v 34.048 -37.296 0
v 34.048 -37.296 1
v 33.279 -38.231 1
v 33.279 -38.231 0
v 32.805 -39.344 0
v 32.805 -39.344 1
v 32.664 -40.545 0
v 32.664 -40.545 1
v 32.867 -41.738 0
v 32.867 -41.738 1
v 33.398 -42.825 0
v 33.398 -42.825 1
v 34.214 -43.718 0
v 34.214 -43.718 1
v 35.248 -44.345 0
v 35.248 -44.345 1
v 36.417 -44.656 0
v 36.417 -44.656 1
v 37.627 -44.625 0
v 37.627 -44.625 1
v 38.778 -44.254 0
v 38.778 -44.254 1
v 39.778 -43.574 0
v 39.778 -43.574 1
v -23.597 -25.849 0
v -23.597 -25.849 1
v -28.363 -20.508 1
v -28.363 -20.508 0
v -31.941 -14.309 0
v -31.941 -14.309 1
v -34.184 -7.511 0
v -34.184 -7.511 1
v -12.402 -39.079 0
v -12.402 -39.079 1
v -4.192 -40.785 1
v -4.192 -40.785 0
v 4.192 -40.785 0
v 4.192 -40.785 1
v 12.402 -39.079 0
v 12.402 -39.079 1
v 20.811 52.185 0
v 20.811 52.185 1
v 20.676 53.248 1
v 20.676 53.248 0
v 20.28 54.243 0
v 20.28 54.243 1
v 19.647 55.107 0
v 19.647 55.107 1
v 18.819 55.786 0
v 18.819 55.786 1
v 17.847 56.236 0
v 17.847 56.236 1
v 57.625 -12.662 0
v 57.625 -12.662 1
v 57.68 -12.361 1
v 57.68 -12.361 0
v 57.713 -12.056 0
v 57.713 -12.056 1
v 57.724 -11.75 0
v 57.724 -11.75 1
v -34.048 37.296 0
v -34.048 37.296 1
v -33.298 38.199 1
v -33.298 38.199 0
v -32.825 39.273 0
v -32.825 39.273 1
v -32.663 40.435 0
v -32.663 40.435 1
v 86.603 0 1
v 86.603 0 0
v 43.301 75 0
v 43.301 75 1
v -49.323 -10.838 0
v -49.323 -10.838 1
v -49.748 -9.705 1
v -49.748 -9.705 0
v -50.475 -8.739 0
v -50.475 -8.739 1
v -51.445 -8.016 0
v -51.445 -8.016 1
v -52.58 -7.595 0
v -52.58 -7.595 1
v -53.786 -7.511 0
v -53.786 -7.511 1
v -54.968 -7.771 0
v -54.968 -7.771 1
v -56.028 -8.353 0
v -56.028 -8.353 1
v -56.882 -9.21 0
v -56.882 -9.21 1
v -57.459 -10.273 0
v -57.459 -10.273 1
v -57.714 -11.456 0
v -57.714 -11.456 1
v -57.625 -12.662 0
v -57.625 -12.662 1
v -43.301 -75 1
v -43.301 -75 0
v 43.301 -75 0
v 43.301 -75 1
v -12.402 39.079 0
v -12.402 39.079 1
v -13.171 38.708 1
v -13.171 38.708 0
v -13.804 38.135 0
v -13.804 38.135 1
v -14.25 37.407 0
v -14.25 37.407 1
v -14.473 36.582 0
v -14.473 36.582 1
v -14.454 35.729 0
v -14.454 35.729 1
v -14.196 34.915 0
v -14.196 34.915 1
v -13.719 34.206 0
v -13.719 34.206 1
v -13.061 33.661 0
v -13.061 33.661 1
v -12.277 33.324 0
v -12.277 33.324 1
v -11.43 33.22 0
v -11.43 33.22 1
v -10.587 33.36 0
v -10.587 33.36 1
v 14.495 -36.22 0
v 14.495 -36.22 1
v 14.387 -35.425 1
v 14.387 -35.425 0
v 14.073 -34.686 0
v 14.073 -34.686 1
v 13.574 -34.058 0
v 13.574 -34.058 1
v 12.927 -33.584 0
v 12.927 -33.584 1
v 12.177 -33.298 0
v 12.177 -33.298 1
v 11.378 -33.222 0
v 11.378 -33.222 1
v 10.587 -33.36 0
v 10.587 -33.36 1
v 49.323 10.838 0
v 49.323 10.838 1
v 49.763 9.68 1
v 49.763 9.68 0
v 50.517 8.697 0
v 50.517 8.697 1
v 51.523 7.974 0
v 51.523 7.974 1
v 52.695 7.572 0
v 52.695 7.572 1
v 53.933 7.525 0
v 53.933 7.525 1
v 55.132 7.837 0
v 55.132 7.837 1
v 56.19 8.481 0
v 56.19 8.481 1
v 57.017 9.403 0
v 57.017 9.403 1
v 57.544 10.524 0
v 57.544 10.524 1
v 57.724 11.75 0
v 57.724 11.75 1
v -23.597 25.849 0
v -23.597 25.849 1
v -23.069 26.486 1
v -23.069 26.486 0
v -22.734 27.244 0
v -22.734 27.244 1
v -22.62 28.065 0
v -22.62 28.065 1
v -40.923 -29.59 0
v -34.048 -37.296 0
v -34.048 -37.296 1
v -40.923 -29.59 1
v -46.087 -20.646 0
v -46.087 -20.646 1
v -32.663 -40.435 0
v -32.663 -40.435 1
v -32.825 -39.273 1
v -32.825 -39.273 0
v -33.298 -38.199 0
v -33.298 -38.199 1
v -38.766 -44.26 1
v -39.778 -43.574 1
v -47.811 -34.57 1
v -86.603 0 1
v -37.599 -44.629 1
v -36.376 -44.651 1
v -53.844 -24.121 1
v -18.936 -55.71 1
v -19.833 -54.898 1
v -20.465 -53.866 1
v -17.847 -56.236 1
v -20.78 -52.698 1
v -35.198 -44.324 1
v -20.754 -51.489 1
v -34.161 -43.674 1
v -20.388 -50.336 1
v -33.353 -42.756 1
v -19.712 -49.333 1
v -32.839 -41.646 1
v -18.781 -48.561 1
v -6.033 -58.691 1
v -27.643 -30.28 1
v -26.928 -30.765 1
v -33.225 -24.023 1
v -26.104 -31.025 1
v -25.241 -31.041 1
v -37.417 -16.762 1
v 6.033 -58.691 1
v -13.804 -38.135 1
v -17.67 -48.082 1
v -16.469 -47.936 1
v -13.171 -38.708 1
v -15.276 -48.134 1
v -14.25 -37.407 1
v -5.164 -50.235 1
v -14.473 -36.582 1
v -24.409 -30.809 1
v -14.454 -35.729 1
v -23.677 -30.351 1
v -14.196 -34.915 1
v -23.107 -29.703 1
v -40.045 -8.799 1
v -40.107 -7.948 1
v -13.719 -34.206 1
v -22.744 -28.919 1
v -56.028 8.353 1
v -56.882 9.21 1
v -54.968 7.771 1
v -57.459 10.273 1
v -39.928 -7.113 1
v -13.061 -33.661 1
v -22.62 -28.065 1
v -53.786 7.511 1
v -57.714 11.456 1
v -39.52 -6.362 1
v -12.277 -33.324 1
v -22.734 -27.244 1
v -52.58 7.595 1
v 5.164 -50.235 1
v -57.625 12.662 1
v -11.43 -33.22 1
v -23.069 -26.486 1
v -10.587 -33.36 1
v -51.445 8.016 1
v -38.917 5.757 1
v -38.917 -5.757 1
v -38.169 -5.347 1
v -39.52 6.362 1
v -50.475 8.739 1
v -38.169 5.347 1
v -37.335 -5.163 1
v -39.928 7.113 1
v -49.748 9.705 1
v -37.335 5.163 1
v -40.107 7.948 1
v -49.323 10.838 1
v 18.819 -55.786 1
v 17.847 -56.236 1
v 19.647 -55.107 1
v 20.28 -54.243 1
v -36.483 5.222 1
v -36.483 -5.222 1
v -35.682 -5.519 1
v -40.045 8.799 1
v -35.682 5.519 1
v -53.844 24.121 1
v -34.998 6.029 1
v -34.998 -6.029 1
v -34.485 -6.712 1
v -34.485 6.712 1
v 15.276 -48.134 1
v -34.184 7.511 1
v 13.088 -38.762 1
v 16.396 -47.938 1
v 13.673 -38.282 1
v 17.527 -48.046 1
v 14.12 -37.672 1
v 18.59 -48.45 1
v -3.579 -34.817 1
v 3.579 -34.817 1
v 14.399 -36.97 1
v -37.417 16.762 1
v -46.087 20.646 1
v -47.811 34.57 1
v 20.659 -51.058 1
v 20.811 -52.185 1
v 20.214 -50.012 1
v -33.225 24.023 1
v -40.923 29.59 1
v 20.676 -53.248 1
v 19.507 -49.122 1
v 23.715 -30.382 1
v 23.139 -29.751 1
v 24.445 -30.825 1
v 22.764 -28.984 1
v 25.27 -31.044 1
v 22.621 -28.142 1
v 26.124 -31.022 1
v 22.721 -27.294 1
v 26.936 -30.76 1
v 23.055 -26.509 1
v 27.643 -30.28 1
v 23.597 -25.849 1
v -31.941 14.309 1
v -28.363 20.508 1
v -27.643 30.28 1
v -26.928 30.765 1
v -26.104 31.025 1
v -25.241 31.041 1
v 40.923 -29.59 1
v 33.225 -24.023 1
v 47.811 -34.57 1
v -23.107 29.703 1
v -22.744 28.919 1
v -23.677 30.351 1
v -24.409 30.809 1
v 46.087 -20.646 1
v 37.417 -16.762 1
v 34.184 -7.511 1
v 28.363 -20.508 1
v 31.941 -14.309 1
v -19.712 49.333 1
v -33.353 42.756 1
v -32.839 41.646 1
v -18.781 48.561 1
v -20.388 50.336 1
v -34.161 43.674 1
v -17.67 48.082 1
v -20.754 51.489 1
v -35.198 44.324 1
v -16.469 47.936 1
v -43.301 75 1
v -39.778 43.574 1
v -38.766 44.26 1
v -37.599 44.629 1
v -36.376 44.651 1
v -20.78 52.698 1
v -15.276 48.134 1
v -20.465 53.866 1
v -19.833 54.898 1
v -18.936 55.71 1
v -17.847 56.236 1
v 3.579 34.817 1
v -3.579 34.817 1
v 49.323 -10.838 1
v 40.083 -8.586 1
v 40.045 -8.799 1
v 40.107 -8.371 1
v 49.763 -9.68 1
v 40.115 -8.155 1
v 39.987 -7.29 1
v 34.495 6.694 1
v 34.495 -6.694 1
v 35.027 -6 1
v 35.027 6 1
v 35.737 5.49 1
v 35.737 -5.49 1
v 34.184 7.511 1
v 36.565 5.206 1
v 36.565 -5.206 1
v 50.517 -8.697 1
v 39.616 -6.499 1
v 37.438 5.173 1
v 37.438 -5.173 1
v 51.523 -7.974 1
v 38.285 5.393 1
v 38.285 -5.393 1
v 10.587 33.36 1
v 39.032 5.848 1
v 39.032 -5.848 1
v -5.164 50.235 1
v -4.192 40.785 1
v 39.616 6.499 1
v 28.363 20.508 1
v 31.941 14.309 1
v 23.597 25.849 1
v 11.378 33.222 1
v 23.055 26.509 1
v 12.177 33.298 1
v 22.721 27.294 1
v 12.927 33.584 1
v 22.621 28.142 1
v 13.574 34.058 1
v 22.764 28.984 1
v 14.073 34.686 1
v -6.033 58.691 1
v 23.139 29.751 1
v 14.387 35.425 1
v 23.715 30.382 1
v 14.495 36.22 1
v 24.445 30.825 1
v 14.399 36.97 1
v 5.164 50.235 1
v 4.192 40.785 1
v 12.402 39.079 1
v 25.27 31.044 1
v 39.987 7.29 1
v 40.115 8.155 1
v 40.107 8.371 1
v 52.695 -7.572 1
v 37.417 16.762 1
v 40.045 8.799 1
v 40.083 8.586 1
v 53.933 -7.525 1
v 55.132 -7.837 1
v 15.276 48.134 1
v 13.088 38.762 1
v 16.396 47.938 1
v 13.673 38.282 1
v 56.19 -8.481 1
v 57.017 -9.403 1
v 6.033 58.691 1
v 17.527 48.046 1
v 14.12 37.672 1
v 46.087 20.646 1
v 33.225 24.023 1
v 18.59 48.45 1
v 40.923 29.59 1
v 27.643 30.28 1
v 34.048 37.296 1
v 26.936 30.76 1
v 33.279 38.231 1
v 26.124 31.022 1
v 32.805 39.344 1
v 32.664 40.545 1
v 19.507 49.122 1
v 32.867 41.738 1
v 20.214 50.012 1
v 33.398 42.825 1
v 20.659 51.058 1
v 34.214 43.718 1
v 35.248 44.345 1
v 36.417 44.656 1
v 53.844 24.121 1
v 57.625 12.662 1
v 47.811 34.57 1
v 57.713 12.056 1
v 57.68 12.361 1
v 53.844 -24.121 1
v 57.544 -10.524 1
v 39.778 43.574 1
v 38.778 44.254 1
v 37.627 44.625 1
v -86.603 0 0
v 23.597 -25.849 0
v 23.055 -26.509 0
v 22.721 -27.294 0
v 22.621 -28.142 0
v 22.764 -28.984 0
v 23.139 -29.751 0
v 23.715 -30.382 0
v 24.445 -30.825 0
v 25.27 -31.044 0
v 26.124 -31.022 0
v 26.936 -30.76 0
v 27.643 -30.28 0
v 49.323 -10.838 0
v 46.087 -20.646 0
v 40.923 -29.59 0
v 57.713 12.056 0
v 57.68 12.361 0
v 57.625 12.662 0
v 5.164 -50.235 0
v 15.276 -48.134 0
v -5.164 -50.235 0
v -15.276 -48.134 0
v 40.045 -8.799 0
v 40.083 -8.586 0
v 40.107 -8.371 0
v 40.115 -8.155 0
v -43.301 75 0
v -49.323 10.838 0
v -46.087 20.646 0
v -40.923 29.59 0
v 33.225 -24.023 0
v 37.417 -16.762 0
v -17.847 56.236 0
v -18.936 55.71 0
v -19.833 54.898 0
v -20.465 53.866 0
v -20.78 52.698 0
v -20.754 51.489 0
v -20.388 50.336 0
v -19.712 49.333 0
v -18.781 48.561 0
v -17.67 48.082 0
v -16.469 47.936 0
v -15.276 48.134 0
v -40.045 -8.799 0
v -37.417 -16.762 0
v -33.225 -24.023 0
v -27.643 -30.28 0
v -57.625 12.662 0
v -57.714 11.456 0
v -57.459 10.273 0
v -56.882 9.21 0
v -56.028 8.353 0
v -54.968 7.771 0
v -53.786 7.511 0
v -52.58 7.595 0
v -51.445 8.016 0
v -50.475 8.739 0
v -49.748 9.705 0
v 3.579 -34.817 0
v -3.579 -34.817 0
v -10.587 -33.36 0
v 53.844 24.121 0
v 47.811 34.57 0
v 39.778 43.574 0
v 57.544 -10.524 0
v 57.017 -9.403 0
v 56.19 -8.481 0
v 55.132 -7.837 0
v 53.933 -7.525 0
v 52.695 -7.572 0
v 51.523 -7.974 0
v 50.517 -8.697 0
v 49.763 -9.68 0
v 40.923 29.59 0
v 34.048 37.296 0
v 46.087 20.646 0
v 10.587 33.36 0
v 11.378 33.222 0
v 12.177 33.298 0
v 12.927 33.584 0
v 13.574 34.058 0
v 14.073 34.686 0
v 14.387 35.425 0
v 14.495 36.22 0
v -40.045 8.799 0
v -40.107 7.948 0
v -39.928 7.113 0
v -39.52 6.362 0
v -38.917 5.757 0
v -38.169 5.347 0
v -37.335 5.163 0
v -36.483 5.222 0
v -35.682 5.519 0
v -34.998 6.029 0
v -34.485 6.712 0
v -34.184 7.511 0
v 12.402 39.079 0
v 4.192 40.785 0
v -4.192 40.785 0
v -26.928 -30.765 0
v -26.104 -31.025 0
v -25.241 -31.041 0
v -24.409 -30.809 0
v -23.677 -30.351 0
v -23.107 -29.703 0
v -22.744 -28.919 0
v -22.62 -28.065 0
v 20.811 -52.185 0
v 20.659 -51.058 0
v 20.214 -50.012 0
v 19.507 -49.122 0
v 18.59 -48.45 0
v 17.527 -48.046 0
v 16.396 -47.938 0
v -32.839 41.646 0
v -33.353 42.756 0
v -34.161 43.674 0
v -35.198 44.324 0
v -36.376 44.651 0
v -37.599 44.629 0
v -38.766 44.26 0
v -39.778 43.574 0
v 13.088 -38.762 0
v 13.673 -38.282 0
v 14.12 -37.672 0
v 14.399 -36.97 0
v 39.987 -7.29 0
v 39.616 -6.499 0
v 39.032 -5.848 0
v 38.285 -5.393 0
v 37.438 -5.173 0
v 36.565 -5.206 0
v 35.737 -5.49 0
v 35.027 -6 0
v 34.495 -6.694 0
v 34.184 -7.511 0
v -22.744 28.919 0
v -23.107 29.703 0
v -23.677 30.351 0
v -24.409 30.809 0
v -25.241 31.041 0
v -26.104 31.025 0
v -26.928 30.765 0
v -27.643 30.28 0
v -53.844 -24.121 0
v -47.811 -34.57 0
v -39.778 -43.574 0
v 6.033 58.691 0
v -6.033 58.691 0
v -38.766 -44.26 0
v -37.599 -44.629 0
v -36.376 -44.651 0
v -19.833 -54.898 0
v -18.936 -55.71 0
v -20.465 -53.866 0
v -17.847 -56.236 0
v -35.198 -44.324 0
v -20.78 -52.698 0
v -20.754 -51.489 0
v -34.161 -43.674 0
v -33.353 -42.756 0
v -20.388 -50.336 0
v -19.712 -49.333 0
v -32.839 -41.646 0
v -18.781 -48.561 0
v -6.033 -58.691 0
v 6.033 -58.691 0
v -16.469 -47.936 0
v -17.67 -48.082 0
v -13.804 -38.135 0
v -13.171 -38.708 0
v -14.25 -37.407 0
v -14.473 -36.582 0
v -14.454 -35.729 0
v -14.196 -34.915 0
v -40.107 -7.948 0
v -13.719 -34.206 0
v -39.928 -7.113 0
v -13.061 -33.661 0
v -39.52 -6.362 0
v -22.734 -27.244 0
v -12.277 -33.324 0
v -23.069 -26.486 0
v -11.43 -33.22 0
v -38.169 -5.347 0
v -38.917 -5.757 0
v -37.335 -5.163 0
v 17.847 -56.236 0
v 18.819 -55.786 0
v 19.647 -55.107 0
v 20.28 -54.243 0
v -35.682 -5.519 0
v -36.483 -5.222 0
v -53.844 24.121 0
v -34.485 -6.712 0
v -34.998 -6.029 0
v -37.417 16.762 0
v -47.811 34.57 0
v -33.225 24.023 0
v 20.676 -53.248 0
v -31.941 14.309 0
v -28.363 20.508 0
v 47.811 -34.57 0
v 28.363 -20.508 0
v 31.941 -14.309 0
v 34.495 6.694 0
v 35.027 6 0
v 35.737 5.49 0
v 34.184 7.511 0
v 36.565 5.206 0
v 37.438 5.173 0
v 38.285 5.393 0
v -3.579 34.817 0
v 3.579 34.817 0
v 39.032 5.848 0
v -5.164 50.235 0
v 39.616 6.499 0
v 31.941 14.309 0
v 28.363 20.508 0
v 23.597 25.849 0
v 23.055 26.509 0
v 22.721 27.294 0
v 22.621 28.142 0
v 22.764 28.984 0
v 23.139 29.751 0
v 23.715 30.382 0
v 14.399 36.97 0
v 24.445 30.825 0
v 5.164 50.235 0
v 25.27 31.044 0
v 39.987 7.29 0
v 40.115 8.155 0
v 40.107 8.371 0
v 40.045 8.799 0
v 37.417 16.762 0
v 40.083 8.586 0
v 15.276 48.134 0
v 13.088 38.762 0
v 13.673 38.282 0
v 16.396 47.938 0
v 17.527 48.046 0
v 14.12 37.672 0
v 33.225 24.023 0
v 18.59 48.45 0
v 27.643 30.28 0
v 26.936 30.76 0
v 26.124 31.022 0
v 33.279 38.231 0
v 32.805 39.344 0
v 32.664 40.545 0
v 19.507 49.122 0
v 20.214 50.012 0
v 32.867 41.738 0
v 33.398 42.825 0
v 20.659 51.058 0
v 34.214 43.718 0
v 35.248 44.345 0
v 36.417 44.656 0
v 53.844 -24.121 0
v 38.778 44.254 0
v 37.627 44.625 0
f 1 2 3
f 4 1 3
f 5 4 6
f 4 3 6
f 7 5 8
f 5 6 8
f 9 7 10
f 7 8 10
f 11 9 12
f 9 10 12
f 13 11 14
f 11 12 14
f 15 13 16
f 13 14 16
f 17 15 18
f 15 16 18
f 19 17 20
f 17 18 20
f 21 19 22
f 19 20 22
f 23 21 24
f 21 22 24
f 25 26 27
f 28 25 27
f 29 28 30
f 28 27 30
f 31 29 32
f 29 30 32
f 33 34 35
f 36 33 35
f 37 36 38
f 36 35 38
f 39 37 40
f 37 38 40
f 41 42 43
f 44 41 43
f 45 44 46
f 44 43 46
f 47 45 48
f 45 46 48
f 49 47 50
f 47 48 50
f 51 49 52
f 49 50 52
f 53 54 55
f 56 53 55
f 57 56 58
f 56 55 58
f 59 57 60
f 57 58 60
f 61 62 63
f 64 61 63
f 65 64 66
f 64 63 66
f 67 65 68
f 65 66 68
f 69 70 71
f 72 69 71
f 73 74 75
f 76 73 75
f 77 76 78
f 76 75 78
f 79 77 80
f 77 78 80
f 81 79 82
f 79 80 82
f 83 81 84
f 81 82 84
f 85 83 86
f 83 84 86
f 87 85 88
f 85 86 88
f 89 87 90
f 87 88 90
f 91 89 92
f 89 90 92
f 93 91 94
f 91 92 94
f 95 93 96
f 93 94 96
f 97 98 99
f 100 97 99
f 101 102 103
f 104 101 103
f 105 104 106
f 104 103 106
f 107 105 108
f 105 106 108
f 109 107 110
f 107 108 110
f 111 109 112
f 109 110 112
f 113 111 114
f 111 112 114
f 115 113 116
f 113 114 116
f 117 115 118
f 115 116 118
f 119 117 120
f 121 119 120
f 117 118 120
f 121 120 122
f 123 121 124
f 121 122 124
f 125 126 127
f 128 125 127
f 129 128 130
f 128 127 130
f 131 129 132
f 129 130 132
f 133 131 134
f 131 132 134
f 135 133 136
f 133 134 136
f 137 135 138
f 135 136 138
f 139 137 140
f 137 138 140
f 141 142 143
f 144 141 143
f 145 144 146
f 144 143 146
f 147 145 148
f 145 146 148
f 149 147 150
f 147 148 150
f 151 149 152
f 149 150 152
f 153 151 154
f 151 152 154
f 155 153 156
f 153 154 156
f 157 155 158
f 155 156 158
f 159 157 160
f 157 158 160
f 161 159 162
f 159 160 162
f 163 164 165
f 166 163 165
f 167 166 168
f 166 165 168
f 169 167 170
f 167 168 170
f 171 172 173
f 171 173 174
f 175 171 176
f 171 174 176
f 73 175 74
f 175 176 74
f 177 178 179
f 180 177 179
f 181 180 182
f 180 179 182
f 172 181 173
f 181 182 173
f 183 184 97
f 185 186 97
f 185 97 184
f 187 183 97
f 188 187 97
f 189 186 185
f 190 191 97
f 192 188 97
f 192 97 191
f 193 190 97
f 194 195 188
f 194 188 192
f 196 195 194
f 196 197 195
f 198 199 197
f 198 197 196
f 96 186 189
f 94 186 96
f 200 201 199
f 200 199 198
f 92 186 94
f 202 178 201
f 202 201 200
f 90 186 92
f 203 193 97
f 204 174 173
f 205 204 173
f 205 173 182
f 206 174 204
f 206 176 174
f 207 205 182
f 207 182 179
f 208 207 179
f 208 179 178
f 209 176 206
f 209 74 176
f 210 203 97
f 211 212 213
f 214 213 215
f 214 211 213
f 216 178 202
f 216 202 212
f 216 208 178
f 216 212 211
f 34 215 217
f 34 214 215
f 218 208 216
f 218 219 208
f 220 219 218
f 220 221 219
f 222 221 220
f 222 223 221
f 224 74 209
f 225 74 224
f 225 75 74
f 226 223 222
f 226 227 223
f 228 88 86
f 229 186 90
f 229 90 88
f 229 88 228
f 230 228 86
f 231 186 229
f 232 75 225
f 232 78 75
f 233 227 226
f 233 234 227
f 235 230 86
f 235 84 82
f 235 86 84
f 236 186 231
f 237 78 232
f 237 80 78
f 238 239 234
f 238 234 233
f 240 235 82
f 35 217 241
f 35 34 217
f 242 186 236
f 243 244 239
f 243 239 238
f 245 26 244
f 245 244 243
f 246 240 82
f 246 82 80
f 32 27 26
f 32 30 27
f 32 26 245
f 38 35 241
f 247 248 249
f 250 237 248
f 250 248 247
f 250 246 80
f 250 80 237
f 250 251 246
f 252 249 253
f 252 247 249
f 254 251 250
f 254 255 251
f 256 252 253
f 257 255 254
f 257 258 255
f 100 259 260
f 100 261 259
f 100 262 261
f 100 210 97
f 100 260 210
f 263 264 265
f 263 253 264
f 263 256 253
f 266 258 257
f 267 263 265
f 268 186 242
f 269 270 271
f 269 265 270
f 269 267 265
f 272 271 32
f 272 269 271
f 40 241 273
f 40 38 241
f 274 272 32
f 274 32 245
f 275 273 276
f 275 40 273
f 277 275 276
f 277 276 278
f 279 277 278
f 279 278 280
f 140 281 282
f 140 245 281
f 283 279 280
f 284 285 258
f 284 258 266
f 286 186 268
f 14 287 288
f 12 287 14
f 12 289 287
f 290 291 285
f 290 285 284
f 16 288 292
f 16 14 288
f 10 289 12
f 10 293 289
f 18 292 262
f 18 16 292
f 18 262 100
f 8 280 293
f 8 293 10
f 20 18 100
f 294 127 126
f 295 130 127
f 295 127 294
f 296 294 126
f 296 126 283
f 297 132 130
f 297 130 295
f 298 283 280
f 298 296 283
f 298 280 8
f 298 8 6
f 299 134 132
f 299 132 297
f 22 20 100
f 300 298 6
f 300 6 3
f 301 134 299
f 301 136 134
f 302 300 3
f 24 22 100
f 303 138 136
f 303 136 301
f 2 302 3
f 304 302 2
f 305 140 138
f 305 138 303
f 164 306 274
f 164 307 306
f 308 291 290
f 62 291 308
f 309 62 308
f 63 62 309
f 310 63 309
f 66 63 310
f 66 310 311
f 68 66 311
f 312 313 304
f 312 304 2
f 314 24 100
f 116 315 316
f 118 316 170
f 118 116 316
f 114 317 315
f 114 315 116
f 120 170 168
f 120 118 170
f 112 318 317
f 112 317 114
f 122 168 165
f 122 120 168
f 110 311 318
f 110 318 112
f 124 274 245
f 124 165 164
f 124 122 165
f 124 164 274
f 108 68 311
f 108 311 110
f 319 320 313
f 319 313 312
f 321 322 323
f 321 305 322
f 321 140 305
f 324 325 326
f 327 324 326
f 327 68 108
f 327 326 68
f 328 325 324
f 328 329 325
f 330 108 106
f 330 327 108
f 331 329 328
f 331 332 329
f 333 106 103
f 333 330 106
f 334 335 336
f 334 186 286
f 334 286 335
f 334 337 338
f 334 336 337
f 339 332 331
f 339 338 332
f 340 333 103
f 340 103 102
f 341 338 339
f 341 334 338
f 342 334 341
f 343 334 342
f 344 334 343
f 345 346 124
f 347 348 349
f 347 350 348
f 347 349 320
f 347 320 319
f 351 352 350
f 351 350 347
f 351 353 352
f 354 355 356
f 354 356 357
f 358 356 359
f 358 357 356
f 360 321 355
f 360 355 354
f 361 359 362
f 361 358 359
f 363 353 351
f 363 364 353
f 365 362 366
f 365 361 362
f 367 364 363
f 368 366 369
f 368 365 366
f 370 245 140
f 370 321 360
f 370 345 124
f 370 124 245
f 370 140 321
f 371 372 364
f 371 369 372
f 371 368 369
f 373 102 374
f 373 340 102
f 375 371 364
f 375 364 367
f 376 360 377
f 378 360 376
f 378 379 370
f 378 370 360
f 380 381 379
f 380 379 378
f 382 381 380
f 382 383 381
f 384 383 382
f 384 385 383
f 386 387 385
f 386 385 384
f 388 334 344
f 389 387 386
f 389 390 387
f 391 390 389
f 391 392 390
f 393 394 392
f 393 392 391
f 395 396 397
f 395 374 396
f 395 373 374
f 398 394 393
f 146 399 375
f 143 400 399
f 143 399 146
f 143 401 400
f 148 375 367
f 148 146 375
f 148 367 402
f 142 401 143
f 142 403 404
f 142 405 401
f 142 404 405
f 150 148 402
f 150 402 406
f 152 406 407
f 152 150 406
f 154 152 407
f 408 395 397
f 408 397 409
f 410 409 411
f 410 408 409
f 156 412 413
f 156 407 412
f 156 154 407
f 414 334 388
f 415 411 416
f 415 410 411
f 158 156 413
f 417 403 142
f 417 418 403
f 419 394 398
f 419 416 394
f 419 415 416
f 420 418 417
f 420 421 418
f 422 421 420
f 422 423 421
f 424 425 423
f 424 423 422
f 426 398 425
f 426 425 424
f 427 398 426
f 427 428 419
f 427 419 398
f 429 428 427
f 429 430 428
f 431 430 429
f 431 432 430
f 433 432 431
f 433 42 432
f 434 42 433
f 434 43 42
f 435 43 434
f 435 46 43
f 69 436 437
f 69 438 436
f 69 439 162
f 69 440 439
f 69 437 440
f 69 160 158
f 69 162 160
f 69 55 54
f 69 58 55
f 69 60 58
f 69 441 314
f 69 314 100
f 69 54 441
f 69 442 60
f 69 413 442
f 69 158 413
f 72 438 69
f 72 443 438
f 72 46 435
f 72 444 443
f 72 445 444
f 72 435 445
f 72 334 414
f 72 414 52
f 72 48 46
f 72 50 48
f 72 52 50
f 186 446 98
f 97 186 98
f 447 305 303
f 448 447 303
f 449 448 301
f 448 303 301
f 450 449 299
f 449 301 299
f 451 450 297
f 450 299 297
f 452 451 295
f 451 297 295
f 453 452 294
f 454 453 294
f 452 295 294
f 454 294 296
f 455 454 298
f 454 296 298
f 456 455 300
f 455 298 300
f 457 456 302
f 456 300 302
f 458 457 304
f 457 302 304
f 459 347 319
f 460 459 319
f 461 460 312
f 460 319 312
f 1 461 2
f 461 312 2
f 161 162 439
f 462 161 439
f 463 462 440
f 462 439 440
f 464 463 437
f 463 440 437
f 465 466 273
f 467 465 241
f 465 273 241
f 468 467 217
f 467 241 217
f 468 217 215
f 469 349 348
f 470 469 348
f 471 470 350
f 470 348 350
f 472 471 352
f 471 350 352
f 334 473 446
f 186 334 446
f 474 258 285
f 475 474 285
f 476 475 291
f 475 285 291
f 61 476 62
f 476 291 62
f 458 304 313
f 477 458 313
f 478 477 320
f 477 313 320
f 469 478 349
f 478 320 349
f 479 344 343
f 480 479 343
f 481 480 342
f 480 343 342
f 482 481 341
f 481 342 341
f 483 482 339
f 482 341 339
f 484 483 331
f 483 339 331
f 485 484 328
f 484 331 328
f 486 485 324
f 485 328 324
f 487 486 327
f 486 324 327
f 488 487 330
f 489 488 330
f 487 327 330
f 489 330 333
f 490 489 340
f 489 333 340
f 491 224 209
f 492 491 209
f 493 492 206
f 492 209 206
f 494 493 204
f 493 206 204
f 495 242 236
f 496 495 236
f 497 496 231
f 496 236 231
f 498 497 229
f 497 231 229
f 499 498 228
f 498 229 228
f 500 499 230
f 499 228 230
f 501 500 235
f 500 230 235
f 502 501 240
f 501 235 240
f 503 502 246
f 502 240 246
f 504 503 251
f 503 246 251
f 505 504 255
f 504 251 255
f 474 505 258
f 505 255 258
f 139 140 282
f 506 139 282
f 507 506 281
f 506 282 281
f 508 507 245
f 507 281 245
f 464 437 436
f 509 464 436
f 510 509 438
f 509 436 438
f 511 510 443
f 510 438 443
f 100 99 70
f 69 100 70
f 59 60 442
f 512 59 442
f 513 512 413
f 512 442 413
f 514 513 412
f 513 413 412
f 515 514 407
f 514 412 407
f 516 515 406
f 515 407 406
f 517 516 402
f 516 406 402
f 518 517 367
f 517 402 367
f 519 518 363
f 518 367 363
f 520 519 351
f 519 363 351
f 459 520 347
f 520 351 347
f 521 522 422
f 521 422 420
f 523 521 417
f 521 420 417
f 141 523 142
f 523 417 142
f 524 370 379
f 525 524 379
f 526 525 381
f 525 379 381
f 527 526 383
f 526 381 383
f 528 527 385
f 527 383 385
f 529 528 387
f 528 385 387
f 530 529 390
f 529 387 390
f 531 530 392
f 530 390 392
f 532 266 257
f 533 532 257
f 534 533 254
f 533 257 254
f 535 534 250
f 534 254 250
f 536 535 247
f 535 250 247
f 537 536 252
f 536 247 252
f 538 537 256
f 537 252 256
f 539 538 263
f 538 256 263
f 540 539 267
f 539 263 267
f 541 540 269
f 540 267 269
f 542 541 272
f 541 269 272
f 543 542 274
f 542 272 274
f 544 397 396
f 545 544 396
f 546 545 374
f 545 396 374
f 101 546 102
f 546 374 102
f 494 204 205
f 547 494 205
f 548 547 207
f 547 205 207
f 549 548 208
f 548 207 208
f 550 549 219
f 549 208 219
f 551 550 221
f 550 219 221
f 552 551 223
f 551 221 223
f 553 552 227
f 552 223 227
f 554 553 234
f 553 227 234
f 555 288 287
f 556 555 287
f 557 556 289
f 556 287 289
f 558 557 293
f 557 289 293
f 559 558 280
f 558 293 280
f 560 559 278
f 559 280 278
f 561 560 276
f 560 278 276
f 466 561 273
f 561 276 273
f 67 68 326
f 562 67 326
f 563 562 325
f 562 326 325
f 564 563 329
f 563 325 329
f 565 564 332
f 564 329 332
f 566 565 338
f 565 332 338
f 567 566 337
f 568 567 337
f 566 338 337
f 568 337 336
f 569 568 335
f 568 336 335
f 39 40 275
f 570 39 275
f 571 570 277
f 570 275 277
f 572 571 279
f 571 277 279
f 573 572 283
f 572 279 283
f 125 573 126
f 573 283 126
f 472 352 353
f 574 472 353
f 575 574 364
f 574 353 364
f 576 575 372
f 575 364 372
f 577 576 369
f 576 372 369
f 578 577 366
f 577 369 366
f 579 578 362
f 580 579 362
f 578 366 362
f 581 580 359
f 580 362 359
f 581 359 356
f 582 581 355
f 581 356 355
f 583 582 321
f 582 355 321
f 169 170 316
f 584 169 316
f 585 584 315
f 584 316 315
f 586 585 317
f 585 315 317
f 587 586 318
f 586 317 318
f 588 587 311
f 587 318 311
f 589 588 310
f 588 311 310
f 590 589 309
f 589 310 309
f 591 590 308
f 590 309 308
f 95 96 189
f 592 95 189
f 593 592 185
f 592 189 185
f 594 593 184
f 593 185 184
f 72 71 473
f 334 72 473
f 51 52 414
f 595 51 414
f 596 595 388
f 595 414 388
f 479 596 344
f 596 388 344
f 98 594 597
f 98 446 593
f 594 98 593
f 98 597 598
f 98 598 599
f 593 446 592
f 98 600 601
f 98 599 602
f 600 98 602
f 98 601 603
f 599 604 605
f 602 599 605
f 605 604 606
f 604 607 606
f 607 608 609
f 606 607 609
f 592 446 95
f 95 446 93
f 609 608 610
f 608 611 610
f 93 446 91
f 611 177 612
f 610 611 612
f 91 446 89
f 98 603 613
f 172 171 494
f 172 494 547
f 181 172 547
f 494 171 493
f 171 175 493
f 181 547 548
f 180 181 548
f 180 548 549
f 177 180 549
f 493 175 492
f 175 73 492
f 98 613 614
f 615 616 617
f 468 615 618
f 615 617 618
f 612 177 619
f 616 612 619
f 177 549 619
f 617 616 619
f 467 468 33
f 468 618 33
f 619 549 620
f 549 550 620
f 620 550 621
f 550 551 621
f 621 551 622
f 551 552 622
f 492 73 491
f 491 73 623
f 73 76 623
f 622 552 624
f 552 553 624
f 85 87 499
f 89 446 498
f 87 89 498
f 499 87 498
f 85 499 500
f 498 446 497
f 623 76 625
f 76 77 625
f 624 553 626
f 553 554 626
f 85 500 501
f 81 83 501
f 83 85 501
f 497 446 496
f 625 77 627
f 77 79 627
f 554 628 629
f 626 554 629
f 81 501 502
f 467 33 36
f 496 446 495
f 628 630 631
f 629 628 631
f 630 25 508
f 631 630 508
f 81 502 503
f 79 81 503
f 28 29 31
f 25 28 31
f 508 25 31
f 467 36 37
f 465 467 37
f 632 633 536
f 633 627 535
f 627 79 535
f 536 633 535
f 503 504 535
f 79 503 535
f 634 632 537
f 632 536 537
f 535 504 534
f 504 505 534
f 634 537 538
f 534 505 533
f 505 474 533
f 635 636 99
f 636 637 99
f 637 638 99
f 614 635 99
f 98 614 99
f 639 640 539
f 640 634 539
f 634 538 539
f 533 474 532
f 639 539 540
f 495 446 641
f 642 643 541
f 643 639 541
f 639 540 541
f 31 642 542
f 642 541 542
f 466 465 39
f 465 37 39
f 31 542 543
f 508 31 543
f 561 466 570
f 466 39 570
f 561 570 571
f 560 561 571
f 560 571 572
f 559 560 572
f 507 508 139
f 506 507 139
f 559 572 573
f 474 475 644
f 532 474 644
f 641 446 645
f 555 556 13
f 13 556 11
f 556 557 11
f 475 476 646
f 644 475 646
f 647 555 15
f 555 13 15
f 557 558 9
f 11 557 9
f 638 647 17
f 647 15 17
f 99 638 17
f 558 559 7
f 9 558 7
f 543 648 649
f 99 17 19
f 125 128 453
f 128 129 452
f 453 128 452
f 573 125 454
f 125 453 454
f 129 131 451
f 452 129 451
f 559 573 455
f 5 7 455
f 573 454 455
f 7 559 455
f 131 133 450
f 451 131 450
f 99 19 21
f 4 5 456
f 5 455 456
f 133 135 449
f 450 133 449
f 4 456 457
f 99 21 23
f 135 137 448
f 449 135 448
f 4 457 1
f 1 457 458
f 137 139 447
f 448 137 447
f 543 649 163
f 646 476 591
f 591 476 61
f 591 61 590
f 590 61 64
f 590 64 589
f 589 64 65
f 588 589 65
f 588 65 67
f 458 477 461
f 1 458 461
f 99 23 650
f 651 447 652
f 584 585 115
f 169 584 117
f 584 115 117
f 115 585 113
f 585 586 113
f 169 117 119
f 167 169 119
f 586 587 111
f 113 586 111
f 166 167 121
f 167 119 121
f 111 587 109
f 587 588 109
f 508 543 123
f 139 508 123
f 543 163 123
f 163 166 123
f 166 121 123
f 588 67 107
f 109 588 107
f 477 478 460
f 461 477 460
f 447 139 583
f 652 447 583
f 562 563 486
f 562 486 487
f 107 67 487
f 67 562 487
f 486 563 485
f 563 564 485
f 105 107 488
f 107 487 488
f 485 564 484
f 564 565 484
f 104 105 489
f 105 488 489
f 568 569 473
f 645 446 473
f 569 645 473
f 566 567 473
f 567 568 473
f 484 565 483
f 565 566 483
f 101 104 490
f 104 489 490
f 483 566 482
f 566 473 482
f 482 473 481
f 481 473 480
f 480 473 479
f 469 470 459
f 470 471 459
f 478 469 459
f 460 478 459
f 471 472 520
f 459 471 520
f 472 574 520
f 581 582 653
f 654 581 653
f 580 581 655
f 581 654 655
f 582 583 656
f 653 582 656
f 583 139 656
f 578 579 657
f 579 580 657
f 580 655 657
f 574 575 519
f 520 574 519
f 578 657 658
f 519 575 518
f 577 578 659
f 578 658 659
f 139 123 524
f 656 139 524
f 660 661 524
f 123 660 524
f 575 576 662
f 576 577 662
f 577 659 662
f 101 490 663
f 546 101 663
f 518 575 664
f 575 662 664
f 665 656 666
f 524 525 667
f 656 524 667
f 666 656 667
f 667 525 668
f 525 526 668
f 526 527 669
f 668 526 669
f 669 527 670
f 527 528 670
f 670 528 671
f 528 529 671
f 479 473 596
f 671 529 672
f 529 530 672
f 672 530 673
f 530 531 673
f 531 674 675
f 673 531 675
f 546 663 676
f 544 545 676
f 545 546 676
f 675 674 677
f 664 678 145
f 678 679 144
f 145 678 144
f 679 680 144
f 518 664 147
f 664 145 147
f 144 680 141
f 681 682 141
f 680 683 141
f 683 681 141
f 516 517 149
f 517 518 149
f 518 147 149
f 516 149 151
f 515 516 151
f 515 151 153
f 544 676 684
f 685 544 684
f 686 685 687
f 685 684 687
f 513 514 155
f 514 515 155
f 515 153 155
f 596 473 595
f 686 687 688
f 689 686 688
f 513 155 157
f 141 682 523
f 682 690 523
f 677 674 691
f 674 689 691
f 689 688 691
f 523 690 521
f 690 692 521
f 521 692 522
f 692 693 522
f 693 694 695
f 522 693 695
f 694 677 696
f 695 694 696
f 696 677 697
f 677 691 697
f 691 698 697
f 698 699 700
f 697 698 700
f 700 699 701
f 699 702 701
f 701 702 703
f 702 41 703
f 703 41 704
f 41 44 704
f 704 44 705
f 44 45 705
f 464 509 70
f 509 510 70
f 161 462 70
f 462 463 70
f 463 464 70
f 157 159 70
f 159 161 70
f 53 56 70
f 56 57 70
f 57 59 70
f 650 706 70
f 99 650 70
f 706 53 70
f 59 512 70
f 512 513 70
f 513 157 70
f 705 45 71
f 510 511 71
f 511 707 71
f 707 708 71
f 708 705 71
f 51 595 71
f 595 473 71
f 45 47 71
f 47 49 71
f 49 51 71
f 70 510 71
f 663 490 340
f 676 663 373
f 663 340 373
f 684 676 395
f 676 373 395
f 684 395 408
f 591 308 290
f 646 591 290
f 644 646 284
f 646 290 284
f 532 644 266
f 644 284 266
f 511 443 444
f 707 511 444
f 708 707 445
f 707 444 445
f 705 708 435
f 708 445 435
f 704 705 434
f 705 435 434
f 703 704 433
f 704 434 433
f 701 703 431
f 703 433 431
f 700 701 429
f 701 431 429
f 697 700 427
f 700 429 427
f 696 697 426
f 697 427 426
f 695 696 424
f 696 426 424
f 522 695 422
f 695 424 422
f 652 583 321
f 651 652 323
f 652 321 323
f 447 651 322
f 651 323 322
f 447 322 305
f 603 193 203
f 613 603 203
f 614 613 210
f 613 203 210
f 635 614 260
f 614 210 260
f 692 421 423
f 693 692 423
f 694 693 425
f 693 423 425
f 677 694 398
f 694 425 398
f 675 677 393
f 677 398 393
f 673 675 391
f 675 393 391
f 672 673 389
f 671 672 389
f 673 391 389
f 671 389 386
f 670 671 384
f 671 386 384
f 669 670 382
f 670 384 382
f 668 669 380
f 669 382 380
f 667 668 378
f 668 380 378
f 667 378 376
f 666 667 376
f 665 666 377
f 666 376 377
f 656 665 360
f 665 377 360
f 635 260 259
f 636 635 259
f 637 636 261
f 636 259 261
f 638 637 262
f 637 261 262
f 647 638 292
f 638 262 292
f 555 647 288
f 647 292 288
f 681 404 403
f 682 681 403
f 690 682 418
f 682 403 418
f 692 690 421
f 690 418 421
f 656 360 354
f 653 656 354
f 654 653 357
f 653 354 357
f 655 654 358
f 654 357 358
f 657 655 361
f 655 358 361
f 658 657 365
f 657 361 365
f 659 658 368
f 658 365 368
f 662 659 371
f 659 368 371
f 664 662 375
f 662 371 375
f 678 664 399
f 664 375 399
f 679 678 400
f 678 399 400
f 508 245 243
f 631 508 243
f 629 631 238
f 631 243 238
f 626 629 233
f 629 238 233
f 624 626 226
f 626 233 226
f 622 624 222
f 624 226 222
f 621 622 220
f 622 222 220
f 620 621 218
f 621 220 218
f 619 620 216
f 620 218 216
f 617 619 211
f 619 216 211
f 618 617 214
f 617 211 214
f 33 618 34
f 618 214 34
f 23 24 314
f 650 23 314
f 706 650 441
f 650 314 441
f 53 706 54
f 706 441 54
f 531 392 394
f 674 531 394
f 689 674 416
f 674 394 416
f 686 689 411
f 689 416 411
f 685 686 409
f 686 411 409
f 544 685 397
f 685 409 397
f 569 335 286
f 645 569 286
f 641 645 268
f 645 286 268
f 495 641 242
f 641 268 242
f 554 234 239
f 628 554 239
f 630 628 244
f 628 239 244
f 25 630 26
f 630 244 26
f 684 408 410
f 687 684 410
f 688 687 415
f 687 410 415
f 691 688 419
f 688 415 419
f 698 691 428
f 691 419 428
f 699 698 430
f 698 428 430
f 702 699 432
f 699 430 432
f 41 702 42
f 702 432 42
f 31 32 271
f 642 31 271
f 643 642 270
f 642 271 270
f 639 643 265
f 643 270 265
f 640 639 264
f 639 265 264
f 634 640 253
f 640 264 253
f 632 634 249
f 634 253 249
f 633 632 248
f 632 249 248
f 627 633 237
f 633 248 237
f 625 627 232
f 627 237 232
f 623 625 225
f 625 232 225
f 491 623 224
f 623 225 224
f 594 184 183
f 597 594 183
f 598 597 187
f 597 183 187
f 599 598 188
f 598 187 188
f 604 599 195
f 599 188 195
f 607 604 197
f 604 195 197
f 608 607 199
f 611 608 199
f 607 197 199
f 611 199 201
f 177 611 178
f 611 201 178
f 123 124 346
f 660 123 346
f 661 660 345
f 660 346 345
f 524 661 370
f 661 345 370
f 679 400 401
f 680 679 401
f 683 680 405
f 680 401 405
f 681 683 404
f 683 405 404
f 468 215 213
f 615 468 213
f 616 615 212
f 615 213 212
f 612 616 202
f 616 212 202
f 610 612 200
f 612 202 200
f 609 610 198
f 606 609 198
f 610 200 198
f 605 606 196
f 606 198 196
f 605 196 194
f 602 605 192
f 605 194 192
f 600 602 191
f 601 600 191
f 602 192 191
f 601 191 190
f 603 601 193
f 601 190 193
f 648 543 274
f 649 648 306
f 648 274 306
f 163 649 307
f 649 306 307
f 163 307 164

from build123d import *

# Parameters (mm, degrees)
F1_DEPTH = 1
F3_DEPTH = 1.001


with BuildPart() as f1:
    # F0 (on Top) → F1 (new body)
    with BuildSketch(Plane.XY):
        Polygon((86.60254, 0), (43.30127, 75), (-43.30127, 75), (-86.60254, 0), (-43.30127, -75), (43.30127, -75), align=None)
    extrude(amount=F1_DEPTH)

    # F2 (on face) → F3 (cut, through all)
    with BuildSketch(Plane.XY.offset(1)):
        with BuildLine():
            ThreePointArc((49.32332, 10.8379), (52.562192, 15.900973), (57.625265, 12.6621))
            ThreePointArc((57.625265, 12.6621), (51.095499, 29.5), (39.778333, 43.573894))
            ThreePointArc((39.778333, 43.573894), (40.801415, 42.150409), (41.162945, 40.435096))
            ThreePointArc((41.162945, 40.435096), (38.628258, 36.546626), (34.047557, 37.296299))
            ThreePointArc((34.047557, 37.296299), (43.734283, 25.25), (49.32332, 10.8379))
        make_face()
        with BuildLine():
            ThreePointArc((57.724293, 11.75), (57.699463, 12.20873), (57.625265, 12.6621))
            ThreePointArc((57.625265, 12.6621), (52.562192, 15.900973), (49.32332, 10.8379))
            ThreePointArc((49.32332, 10.8379), (53.933023, 7.524829), (57.724293, 11.75))
        make_face()
        with BuildLine():
            ThreePointArc((41.162945, 40.435096), (40.801415, 42.150409), (39.778333, 43.573894))
            ThreePointArc((39.778333, 43.573894), (33.774148, 43.300485), (34.047557, 37.296299))
            ThreePointArc((34.047557, 37.296299), (38.628258, 36.546626), (41.162945, 40.435096))
        make_face()
        with BuildLine():
            ThreePointArc((-15.275764, 48.134198), (-13.131608, 49.675239), (-12.311348, 52.185096))
            ThreePointArc((-12.311348, 52.185096), (-14.051491, 55.614836), (-17.846932, 56.235994))
            ThreePointArc((-17.846932, 56.235994), (-20.612246, 50.899512), (-15.275764, 48.134198))
        make_face()
        with BuildLine():
            ThreePointArc((-17.846932, 56.235994), (-14.051491, 55.614836), (-12.311348, 52.185096))
            ThreePointArc((-12.311348, 52.185096), (-13.131608, 49.675239), (-15.275764, 48.134198))
            ThreePointArc((-15.275764, 48.134198), (0, 50.5), (15.275764, 48.134198))
            ThreePointArc((15.275764, 48.134198), (12.51045, 53.47068), (17.846932, 56.235994))
            ThreePointArc((17.846932, 56.235994), (0, 59), (-17.846932, 56.235994))
        make_face()
        with BuildLine():
            ThreePointArc((20.811348, 52.185096), (19.991088, 54.694953), (17.846932, 56.235994))
            ThreePointArc((17.846932, 56.235994), (12.51045, 53.47068), (15.275764, 48.134198))
            ThreePointArc((15.275764, 48.134198), (19.071205, 48.755356), (20.811348, 52.185096))
        make_face()
        with BuildLine():
            ThreePointArc((-49.32332, 10.8379), (-49.249122, 11.29127), (-49.224293, 11.75))
            ThreePointArc((-49.224293, 11.75), (-53.015563, 15.975171), (-57.625265, 12.6621))
            ThreePointArc((-57.625265, 12.6621), (-54.386393, 7.599027), (-49.32332, 10.8379))
        make_face()
        with BuildLine():
            ThreePointArc((-57.625265, 12.6621), (-53.015563, 15.975171), (-49.224293, 11.75))
            ThreePointArc((-49.224293, 11.75), (-49.249122, 11.29127), (-49.32332, 10.8379))
            ThreePointArc((-49.32332, 10.8379), (-43.734283, 25.25), (-34.047557, 37.296299))
            ThreePointArc((-34.047557, 37.296299), (-40.051742, 37.569708), (-39.778333, 43.573894))
            ThreePointArc((-39.778333, 43.573894), (-51.095499, 29.5), (-57.625265, 12.6621))
        make_face()
        with BuildLine():
            ThreePointArc((-32.662945, 40.435096), (-35.197632, 44.323566), (-39.778333, 43.573894))
            ThreePointArc((-39.778333, 43.573894), (-40.051742, 37.569708), (-34.047557, 37.296299))
            ThreePointArc((-34.047557, 37.296299), (-33.024475, 38.719783), (-32.662945, 40.435096))
        make_face()
        with BuildLine():
            ThreePointArc((-39.778333, -43.573894), (-35.197632, -44.323566), (-32.662945, -40.435096))
            ThreePointArc((-32.662945, -40.435096), (-33.024475, -38.719783), (-34.047557, -37.296299))
            ThreePointArc((-34.047557, -37.296299), (-40.051742, -37.569708), (-39.778333, -43.573894))
        make_face()
        with BuildLine():
            ThreePointArc((-39.778333, -43.573894), (-40.051742, -37.569708), (-34.047557, -37.296299))
            ThreePointArc((-34.047557, -37.296299), (-43.734283, -25.25), (-49.32332, -10.8379))
            ThreePointArc((-49.32332, -10.8379), (-49.249122, -11.29127), (-49.224293, -11.75))
            ThreePointArc((-49.224293, -11.75), (-53.015563, -15.975171), (-57.625265, -12.6621))
            ThreePointArc((-57.625265, -12.6621), (-51.095499, -29.5), (-39.778333, -43.573894))
        make_face()
        with BuildLine():
            ThreePointArc((-49.224293, -11.75), (-49.249122, -11.29127), (-49.32332, -10.8379))
            ThreePointArc((-49.32332, -10.8379), (-54.386393, -7.599027), (-57.625265, -12.6621))
            ThreePointArc((-57.625265, -12.6621), (-53.015563, -15.975171), (-49.224293, -11.75))
        make_face()
        with BuildLine():
            ThreePointArc((17.846932, -56.235994), (19.991088, -54.694953), (20.811348, -52.185096))
            ThreePointArc((20.811348, -52.185096), (19.071205, -48.755356), (15.275764, -48.134198))
            ThreePointArc((15.275764, -48.134198), (12.51045, -53.47068), (17.846932, -56.235994))
        make_face()
        with BuildLine():
            ThreePointArc((17.846932, -56.235994), (12.51045, -53.47068), (15.275764, -48.134198))
            ThreePointArc((15.275764, -48.134198), (0, -50.5), (-15.275764, -48.134198))
            ThreePointArc((-15.275764, -48.134198), (-13.131608, -49.675239), (-12.311348, -52.185096))
            ThreePointArc((-12.311348, -52.185096), (-14.051491, -55.614836), (-17.846932, -56.235994))
            ThreePointArc((-17.846932, -56.235994), (0, -59), (17.846932, -56.235994))
        make_face()
        with BuildLine():
            ThreePointArc((-12.311348, -52.185096), (-13.131608, -49.675239), (-15.275764, -48.134198))
            ThreePointArc((-15.275764, -48.134198), (-20.612246, -50.899512), (-17.846932, -56.235994))
            ThreePointArc((-17.846932, -56.235994), (-14.051491, -55.614836), (-12.311348, -52.185096))
        make_face()
        with BuildLine():
            ThreePointArc((57.625265, -12.6621), (57.699463, -12.20873), (57.724293, -11.75))
            ThreePointArc((57.724293, -11.75), (53.933023, -7.524829), (49.32332, -10.8379))
            ThreePointArc((49.32332, -10.8379), (52.562192, -15.900973), (57.625265, -12.6621))
        make_face()
        with BuildLine():
            ThreePointArc((57.625265, -12.6621), (52.562192, -15.900973), (49.32332, -10.8379))
            ThreePointArc((49.32332, -10.8379), (43.734283, -25.25), (34.047557, -37.296299))
            ThreePointArc((34.047557, -37.296299), (38.628258, -36.546626), (41.162945, -40.435096))
            ThreePointArc((41.162945, -40.435096), (40.801415, -42.150409), (39.778333, -43.573894))
            ThreePointArc((39.778333, -43.573894), (51.095499, -29.5), (57.625265, -12.6621))
        make_face()
        with BuildLine():
            ThreePointArc((41.162945, -40.435096), (38.628258, -36.546626), (34.047557, -37.296299))
            ThreePointArc((34.047557, -37.296299), (33.774148, -43.300485), (39.778333, -43.573894))
            ThreePointArc((39.778333, -43.573894), (40.801415, -42.150409), (41.162945, -40.435096))
        make_face()
        with BuildLine():
            ThreePointArc((34.184479, 7.511416), (36.470742, 11.085349), (40.044676, 8.799087))
            ThreePointArc((40.044676, 8.799087), (35.507042, 20.5), (27.642571, 30.280163))
            ThreePointArc((27.642571, 30.280163), (28.364746, 29.275351), (28.619944, 28.064542))
            ThreePointArc((28.619944, 28.064542), (26.830753, 25.319739), (23.597316, 25.84892))
            ThreePointArc((23.597316, 25.84892), (30.310889, 17.5), (34.184479, 7.511416))
        make_face()
        with BuildLine():
            ThreePointArc((40.114578, 8.155251), (40.097051, 8.479061), (40.044676, 8.799087))
            ThreePointArc((40.044676, 8.799087), (36.470742, 11.085349), (34.184479, 7.511416))
            ThreePointArc((34.184479, 7.511416), (37.438387, 5.172778), (40.114578, 8.155251))
        make_face()
        with BuildLine():
            ThreePointArc((28.619944, 28.064542), (28.364746, 29.275351), (27.642571, 30.280163))
            ThreePointArc((27.642571, 30.280163), (23.404322, 30.087169), (23.597316, 25.84892))
            ThreePointArc((23.597316, 25.84892), (26.830753, 25.319739), (28.619944, 28.064542))
        make_face()
        with BuildLine():
            ThreePointArc((-10.587163, 33.360335), (-9.073641, 34.448129), (-8.494634, 36.219793))
            ThreePointArc((-8.494634, 36.219793), (-9.72297, 38.640786), (-12.402105, 39.07925))
            ThreePointArc((-12.402105, 39.07925), (-14.354092, 35.312322), (-10.587163, 33.360335))
        make_face()
        with BuildLine():
            ThreePointArc((-12.402105, 39.07925), (-9.72297, 38.640786), (-8.494634, 36.219793))
            ThreePointArc((-8.494634, 36.219793), (-9.073641, 34.448129), (-10.587163, 33.360335))
            ThreePointArc((-10.587163, 33.360335), (0, 35), (10.587163, 33.360335))
            ThreePointArc((10.587163, 33.360335), (8.635177, 37.127264), (12.402105, 39.07925))
            ThreePointArc((12.402105, 39.07925), (0, 41), (-12.402105, 39.07925))
        make_face()
        with BuildLine():
            ThreePointArc((14.494634, 36.219793), (13.915627, 37.991457), (12.402105, 39.07925))
            ThreePointArc((12.402105, 39.07925), (8.635177, 37.127264), (10.587163, 33.360335))
            ThreePointArc((10.587163, 33.360335), (13.266298, 33.7988), (14.494634, 36.219793))
        make_face()
        with BuildLine():
            ThreePointArc((-34.184479, 7.511416), (-34.132104, 7.831442), (-34.114578, 8.155251))
            ThreePointArc((-34.114578, 8.155251), (-36.790768, 11.137725), (-40.044676, 8.799087))
            ThreePointArc((-40.044676, 8.799087), (-37.758413, 5.225153), (-34.184479, 7.511416))
        make_face()
        with BuildLine():
            ThreePointArc((-40.044676, 8.799087), (-36.790768, 11.137725), (-34.114578, 8.155251))
            ThreePointArc((-34.114578, 8.155251), (-34.132104, 7.831442), (-34.184479, 7.511416))
            ThreePointArc((-34.184479, 7.511416), (-30.310889, 17.5), (-23.597316, 25.84892))
            ThreePointArc((-23.597316, 25.84892), (-27.835565, 26.041914), (-27.642571, 30.280163))
            ThreePointArc((-27.642571, 30.280163), (-35.507042, 20.5), (-40.044676, 8.799087))
        make_face()
        with BuildLine():
            ThreePointArc((-22.619944, 28.064542), (-24.409134, 30.809344), (-27.642571, 30.280163))
            ThreePointArc((-27.642571, 30.280163), (-27.835565, 26.041914), (-23.597316, 25.84892))
            ThreePointArc((-23.597316, 25.84892), (-22.875141, 26.853732), (-22.619944, 28.064542))
        make_face()
        with BuildLine():
            ThreePointArc((-27.642571, -30.280163), (-24.409134, -30.809344), (-22.619944, -28.064542))
            ThreePointArc((-22.619944, -28.064542), (-22.875141, -26.853732), (-23.597316, -25.84892))
            ThreePointArc((-23.597316, -25.84892), (-27.835565, -26.041914), (-27.642571, -30.280163))
        make_face()
        with BuildLine():
            ThreePointArc((-27.642571, -30.280163), (-27.835565, -26.041914), (-23.597316, -25.84892))
            ThreePointArc((-23.597316, -25.84892), (-30.310889, -17.5), (-34.184479, -7.511416))
            ThreePointArc((-34.184479, -7.511416), (-34.132104, -7.831442), (-34.114578, -8.155251))
            ThreePointArc((-34.114578, -8.155251), (-36.790768, -11.137725), (-40.044676, -8.799087))
            ThreePointArc((-40.044676, -8.799087), (-35.507042, -20.5), (-27.642571, -30.280163))
        make_face()
        with BuildLine():
            ThreePointArc((-34.114578, -8.155251), (-34.132104, -7.831442), (-34.184479, -7.511416))
            ThreePointArc((-34.184479, -7.511416), (-37.758413, -5.225153), (-40.044676, -8.799087))
            ThreePointArc((-40.044676, -8.799087), (-36.790768, -11.137725), (-34.114578, -8.155251))
        make_face()
        with BuildLine():
            ThreePointArc((12.402105, -39.07925), (13.915627, -37.991457), (14.494634, -36.219793))
            ThreePointArc((14.494634, -36.219793), (13.266298, -33.7988), (10.587163, -33.360335))
            ThreePointArc((10.587163, -33.360335), (8.635177, -37.127264), (12.402105, -39.07925))
        make_face()
        with BuildLine():
            ThreePointArc((12.402105, -39.07925), (8.635177, -37.127264), (10.587163, -33.360335))
            ThreePointArc((10.587163, -33.360335), (0, -35), (-10.587163, -33.360335))
            ThreePointArc((-10.587163, -33.360335), (-9.073641, -34.448129), (-8.494634, -36.219793))
            ThreePointArc((-8.494634, -36.219793), (-9.72297, -38.640786), (-12.402105, -39.07925))
            ThreePointArc((-12.402105, -39.07925), (0, -41), (12.402105, -39.07925))
        make_face()
        with BuildLine():
            ThreePointArc((-8.494634, -36.219793), (-9.073641, -34.448129), (-10.587163, -33.360335))
            ThreePointArc((-10.587163, -33.360335), (-14.354092, -35.312322), (-12.402105, -39.07925))
            ThreePointArc((-12.402105, -39.07925), (-9.72297, -38.640786), (-8.494634, -36.219793))
        make_face()
        with BuildLine():
            ThreePointArc((40.044676, -8.799087), (40.097051, -8.479061), (40.114578, -8.155251))
            ThreePointArc((40.114578, -8.155251), (37.438387, -5.172778), (34.184479, -7.511416))
            ThreePointArc((34.184479, -7.511416), (36.470742, -11.085349), (40.044676, -8.799087))
        make_face()
        with BuildLine():
            ThreePointArc((40.044676, -8.799087), (36.470742, -11.085349), (34.184479, -7.511416))
            ThreePointArc((34.184479, -7.511416), (30.310889, -17.5), (23.597316, -25.84892))
            ThreePointArc((23.597316, -25.84892), (26.830753, -25.319739), (28.619944, -28.064542))
            ThreePointArc((28.619944, -28.064542), (28.364746, -29.275351), (27.642571, -30.280163))
            ThreePointArc((27.642571, -30.280163), (35.507042, -20.5), (40.044676, -8.799087))
        make_face()
        with BuildLine():
            ThreePointArc((28.619944, -28.064542), (26.830753, -25.319739), (23.597316, -25.84892))
            ThreePointArc((23.597316, -25.84892), (23.404322, -30.087169), (27.642571, -30.280163))
            ThreePointArc((27.642571, -30.280163), (28.364746, -29.275351), (28.619944, -28.064542))
        make_face()
    extrude(amount=-F3_DEPTH, mode=Mode.SUBTRACT)


solid = f1.part
